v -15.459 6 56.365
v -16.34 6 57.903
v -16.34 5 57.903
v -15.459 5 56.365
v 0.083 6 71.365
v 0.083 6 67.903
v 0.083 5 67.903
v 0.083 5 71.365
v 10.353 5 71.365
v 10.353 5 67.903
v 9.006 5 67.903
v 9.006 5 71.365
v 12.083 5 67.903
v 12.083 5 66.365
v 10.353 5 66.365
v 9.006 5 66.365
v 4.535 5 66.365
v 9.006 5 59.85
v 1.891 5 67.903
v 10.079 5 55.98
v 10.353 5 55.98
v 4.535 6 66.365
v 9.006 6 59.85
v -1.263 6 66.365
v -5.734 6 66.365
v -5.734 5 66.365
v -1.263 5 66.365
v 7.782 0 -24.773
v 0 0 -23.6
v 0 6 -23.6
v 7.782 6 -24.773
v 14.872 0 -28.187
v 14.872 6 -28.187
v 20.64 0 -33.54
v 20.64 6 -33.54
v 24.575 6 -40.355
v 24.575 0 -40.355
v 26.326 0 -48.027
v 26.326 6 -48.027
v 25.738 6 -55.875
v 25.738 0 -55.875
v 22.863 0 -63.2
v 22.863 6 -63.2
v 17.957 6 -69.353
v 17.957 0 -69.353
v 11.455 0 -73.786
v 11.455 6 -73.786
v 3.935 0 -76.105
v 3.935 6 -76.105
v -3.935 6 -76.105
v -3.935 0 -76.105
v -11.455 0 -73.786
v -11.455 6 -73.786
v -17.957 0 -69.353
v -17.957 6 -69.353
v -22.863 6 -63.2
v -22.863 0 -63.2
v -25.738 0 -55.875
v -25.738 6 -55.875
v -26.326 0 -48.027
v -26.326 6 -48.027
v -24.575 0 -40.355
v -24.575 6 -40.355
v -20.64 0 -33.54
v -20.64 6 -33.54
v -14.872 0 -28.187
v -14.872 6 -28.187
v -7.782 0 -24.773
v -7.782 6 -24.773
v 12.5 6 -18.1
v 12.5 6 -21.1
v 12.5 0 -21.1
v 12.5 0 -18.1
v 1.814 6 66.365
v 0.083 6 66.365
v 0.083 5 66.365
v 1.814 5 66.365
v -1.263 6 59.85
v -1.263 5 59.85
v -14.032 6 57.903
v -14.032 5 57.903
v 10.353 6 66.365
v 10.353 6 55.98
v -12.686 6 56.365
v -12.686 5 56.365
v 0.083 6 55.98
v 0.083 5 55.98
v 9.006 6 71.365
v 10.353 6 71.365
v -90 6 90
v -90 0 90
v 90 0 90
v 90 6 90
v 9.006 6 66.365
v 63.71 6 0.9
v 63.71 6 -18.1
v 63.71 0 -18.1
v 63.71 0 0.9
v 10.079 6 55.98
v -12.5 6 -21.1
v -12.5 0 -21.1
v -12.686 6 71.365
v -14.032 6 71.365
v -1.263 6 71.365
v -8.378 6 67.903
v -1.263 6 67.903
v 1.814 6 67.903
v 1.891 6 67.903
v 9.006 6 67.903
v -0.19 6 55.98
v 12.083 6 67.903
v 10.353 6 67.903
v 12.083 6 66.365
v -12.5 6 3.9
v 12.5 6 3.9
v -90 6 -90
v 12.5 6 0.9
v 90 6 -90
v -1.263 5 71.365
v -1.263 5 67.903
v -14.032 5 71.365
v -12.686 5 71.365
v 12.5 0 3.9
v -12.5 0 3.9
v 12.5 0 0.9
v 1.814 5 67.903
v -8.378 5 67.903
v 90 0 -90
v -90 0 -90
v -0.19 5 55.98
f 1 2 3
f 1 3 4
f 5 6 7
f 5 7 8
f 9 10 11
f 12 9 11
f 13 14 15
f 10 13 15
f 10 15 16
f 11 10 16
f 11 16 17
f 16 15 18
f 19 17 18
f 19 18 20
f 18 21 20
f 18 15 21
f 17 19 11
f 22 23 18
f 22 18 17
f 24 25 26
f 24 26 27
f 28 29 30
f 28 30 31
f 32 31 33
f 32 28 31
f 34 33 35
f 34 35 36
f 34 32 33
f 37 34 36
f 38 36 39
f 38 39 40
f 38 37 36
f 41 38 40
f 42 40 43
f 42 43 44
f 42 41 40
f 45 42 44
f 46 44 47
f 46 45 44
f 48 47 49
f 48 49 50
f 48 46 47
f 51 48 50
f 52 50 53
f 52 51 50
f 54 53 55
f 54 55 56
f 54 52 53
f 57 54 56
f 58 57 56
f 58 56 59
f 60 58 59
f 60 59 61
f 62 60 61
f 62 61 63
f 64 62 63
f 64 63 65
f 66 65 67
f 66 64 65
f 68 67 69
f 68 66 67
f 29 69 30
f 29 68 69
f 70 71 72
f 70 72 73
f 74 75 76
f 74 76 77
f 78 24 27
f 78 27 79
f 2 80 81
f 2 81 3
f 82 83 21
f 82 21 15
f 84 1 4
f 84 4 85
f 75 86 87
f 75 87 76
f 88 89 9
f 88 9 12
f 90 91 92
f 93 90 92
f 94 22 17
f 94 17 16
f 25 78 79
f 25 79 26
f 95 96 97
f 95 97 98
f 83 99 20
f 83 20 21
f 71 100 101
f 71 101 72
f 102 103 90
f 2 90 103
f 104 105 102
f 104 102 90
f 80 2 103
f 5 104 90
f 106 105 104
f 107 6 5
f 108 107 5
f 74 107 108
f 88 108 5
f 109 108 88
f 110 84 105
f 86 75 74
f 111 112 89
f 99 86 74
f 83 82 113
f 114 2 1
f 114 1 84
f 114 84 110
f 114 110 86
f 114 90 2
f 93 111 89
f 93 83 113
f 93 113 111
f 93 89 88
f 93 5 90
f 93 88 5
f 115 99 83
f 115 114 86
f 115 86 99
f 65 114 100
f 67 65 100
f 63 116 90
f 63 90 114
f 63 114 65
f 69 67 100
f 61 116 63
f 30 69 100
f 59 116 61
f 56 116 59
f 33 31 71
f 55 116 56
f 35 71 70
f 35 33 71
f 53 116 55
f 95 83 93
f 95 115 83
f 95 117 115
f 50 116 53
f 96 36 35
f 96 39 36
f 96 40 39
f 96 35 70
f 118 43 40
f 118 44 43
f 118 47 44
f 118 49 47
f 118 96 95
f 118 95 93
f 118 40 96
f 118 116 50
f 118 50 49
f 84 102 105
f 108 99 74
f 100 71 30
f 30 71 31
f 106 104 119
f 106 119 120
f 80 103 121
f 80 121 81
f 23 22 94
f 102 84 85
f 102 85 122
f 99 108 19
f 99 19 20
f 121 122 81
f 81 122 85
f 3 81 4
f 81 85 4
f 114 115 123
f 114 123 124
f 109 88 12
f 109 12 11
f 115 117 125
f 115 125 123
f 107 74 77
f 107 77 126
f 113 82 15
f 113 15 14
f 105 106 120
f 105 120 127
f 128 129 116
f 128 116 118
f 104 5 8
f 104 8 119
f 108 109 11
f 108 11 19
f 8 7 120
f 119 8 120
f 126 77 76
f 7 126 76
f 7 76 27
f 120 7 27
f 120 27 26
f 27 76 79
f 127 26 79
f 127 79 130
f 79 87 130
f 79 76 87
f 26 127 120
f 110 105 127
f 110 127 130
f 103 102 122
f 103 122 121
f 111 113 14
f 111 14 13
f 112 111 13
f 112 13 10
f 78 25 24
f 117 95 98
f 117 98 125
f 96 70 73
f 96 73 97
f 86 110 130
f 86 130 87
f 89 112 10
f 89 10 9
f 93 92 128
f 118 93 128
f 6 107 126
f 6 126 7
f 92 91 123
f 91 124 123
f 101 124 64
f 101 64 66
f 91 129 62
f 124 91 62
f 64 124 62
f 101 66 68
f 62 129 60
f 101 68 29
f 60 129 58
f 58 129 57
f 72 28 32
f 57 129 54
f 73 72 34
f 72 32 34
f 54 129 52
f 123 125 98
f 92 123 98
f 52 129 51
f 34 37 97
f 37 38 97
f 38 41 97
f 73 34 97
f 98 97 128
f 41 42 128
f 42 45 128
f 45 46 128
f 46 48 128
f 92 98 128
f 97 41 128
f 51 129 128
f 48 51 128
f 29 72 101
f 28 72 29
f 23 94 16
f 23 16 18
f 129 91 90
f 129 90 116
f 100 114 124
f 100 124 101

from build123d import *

# Parameters (mm, degrees)
SKETCH1_W           = 180
SKETCH1_H           = 180
SKETCH1_R           = 26.4
BOSS_EXTRUDE2_DEPTH = 6
CUT_EXTRUDE1_DEPTH  = 10
CUT_EXTRUDE2_DEPTH  = 1


with BuildPart() as part:
    # Sketch1 → Boss-Extrude2 (new body)
    with BuildSketch(Plane(origin=(0, 0, 0), x_dir=(1, 0, 0), z_dir=(0, 1, 0))):
        Rectangle(SKETCH1_W, SKETCH1_H)
        with Locations(Location((0, 50, 0), (0, 0, 270))):
            Circle(SKETCH1_R, mode=Mode.SUBTRACT)
    extrude(amount=BOSS_EXTRUDE2_DEPTH)

    # Sketch2 → Cut-Extrude1 (cut)
    with BuildSketch(Plane(origin=(0, 6, 0), x_dir=(1, 0, 0), z_dir=(0, 1, 0))):
        Polygon((-12.5, 21.1), (12.5, 21.1), (12.5, 18.1), (63.71, 18.1), (63.71, -0.9), (12.5, -0.9), (12.5, -3.9), (-12.5, -3.9), align=None)
    extrude(amount=-CUT_EXTRUDE1_DEPTH, mode=Mode.SUBTRACT)

    # Sketch3 → Cut-Extrude2 (cut)
    # profile 1 of 3: a face of its own
    with BuildSketch(Plane(origin=(0, 6, 0), x_dir=(1, 0, 0), z_dir=(0, 1, 0))):
        Polygon((-15.459341638, -56.364917997), (-12.685904138, -56.364917997), (-12.685904138, -71.364917997), (-14.032057985, -71.364917997), (-14.032057985, -57.903379535), (-16.339750292, -57.903379535), align=None)
    # profile 2 of 3: a face of its own
    with BuildSketch(Plane(origin=(0, 6, 0), x_dir=(1, 0, 0), z_dir=(0, 1, 0))):
        Polygon((-0.190110869, -55.980302612), (0.083326631, -55.980302612), (0.083326631, -66.364917997), (1.814095862, -66.364917997), (1.814095862, -67.903379535), (0.083326631, -67.903379535), (0.083326631, -71.364917997), (-1.262827215, -71.364917997), (-1.262827215, -67.903379535), (-8.378211831, -67.903379535), align=None)
        Polygon((-1.262827215, -66.364917997), (-1.262827215, -59.85049492), (-5.733981062, -66.364917997), align=None, mode=Mode.SUBTRACT)
    # profile 3 of 3: a face of its own
    with BuildSketch(Plane(origin=(0, 6, 0), x_dir=(1, 0, 0), z_dir=(0, 1, 0))):
        Polygon((10.0791199, -55.980302612), (10.3525574, -55.980302612), (10.3525574, -66.364917997), (12.083326631, -66.364917997), (12.083326631, -67.903379535), (10.3525574, -67.903379535), (10.3525574, -71.364917997), (9.006403554, -71.364917997), (9.006403554, -67.903379535), (1.891018938, -67.903379535), align=None)
        Polygon((9.006403554, -66.364917997), (9.006403554, -59.85049492), (4.535249708, -66.364917997), align=None, mode=Mode.SUBTRACT)
    extrude(amount=-CUT_EXTRUDE2_DEPTH, mode=Mode.SUBTRACT)


solid = part.part
